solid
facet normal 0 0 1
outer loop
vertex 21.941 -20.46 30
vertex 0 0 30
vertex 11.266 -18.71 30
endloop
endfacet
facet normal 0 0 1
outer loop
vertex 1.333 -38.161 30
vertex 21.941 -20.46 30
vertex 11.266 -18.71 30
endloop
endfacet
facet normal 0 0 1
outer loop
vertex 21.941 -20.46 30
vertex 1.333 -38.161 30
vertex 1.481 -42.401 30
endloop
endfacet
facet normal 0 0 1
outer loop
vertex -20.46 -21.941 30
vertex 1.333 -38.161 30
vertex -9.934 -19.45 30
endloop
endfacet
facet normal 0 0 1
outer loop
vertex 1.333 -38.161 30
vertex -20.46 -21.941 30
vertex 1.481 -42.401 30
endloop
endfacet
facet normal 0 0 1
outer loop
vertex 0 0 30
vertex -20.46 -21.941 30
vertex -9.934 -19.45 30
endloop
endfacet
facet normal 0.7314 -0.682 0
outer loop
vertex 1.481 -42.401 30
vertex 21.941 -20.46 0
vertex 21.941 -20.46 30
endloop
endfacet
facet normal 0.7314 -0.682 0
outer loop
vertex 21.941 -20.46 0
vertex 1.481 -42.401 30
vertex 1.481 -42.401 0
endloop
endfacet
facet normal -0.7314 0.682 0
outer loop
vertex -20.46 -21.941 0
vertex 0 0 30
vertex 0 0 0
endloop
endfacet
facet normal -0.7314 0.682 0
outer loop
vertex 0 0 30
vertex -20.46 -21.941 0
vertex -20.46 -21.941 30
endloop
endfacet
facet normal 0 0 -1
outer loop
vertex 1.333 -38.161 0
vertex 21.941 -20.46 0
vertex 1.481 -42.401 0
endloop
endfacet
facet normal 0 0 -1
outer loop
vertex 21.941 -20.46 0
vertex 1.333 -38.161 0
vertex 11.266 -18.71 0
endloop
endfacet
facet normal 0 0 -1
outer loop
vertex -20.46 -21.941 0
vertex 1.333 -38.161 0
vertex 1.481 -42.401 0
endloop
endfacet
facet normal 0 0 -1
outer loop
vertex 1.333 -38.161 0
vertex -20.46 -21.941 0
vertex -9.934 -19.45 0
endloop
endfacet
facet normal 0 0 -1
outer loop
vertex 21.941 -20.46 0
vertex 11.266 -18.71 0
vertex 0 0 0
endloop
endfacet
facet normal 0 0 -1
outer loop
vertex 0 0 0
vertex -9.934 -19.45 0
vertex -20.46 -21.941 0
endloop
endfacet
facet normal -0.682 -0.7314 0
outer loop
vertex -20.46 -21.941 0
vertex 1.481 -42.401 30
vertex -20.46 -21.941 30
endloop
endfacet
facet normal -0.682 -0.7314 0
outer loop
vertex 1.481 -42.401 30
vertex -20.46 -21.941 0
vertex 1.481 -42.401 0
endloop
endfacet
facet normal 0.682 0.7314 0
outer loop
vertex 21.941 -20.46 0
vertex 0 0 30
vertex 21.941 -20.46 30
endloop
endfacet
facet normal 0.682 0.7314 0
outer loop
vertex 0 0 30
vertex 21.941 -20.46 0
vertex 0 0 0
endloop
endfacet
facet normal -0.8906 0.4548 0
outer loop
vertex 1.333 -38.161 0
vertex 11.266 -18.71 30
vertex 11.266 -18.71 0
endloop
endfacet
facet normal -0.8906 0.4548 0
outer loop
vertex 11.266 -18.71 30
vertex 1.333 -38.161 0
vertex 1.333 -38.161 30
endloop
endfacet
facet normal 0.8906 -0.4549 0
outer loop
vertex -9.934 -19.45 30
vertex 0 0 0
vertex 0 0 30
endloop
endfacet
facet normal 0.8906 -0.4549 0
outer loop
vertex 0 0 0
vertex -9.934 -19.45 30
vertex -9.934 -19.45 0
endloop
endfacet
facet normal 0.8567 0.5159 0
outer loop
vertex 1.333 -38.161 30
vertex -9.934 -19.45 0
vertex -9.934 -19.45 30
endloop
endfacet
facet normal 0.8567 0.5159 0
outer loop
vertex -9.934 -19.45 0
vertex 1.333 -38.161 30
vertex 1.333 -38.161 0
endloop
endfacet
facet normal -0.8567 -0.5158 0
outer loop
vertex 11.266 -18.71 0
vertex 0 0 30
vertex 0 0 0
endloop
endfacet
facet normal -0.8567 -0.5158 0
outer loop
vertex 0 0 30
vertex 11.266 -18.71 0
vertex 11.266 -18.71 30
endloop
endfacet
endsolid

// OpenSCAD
rotate([0,0,182])
rotate([0,-90,0]){
    difference(){
        rotate([-45,0,0]) {
            cube([30, 30, 30]);
        }
        scale([1,0.9,0.5]) {
            rotate([-45,0,0]) {
                cube([30, 30, 30]);
            }
        }
    }
}
